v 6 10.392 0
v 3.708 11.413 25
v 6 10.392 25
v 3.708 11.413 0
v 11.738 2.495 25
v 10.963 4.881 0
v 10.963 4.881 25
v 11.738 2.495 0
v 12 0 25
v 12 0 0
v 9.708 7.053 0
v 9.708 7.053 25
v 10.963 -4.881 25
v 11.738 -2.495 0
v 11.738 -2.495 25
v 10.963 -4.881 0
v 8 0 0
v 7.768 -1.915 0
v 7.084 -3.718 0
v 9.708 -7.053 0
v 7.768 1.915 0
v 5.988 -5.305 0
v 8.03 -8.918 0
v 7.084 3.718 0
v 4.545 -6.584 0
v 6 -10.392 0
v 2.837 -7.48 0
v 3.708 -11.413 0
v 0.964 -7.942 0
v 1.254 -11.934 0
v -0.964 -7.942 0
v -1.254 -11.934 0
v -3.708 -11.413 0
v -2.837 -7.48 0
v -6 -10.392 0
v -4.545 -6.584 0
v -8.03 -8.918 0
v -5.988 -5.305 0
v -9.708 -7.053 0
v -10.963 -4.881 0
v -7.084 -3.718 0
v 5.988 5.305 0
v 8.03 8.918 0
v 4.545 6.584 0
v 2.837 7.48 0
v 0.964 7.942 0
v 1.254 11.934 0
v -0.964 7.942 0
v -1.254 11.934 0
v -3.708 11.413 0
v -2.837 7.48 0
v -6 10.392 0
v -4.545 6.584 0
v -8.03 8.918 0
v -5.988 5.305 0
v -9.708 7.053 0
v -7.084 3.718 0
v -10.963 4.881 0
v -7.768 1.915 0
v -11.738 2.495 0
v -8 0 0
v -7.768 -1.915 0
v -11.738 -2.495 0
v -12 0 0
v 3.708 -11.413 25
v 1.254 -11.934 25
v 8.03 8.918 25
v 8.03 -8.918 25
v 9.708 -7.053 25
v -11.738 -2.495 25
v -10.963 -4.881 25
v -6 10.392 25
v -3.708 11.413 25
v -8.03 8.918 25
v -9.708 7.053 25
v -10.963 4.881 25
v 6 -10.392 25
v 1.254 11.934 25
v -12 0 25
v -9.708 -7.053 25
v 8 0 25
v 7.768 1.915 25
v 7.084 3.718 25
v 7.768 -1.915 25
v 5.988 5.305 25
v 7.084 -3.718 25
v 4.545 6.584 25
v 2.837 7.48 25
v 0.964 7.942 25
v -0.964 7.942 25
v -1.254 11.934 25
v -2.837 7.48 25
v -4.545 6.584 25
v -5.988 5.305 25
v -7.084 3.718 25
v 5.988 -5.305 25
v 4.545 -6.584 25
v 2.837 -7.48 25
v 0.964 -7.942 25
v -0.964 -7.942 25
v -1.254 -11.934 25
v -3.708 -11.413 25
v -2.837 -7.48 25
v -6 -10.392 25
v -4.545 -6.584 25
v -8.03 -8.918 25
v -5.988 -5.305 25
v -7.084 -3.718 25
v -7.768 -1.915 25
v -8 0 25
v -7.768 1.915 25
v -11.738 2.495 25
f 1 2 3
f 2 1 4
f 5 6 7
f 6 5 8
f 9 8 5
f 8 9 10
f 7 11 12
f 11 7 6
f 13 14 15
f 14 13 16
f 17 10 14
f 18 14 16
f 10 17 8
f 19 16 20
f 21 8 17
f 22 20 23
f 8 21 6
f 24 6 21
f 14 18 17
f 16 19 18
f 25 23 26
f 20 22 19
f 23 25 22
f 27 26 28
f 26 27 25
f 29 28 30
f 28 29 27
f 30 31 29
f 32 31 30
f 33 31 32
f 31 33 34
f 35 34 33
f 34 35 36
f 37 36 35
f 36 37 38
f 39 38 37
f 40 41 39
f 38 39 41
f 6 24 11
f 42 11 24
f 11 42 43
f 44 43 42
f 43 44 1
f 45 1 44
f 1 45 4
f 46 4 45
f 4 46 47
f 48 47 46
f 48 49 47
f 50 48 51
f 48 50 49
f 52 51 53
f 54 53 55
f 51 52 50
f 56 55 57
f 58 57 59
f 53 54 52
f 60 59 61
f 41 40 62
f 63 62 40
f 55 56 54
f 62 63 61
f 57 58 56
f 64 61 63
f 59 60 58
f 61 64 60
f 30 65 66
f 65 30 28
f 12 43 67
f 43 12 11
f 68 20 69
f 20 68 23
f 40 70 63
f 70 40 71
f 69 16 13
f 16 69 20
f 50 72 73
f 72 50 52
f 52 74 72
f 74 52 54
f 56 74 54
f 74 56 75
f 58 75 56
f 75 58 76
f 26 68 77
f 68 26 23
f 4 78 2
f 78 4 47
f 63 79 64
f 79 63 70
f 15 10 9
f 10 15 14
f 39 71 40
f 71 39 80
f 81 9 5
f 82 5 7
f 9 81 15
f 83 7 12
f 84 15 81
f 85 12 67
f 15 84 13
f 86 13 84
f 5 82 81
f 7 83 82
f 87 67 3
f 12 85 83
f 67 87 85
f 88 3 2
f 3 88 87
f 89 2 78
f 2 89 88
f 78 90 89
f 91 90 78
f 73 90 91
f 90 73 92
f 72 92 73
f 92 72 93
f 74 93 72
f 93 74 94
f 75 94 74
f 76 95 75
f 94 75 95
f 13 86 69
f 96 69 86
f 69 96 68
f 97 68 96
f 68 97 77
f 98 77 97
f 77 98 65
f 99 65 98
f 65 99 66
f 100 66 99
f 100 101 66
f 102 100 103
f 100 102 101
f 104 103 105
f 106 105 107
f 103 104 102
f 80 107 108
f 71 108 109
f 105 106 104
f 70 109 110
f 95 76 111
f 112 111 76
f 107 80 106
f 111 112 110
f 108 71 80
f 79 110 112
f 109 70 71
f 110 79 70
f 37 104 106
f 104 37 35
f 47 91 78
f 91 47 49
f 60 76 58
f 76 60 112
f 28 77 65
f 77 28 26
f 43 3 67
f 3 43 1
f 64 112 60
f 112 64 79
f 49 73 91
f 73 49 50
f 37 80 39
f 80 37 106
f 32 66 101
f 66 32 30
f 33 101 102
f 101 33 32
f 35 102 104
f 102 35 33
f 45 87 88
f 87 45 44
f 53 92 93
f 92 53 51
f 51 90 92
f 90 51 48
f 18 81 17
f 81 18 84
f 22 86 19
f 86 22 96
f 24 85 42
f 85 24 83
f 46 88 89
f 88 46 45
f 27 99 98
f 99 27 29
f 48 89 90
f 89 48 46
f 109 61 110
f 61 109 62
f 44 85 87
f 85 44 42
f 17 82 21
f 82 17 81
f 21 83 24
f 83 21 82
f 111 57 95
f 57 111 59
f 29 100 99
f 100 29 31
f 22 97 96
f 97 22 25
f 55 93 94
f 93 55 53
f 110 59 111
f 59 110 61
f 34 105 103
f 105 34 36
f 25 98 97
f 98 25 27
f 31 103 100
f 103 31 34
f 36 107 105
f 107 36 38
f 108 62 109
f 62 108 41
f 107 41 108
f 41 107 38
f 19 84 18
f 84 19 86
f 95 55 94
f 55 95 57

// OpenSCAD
// orcad: hollow cylinder; validation keeps the wall positive.
outer_diameter = 24;
inner_diameter = 16;
height = 25;

difference() {
    cylinder(d = outer_diameter, h = height);
    translate([0, 0, -1]) cylinder(d = inner_diameter, h = height + 2);
}
